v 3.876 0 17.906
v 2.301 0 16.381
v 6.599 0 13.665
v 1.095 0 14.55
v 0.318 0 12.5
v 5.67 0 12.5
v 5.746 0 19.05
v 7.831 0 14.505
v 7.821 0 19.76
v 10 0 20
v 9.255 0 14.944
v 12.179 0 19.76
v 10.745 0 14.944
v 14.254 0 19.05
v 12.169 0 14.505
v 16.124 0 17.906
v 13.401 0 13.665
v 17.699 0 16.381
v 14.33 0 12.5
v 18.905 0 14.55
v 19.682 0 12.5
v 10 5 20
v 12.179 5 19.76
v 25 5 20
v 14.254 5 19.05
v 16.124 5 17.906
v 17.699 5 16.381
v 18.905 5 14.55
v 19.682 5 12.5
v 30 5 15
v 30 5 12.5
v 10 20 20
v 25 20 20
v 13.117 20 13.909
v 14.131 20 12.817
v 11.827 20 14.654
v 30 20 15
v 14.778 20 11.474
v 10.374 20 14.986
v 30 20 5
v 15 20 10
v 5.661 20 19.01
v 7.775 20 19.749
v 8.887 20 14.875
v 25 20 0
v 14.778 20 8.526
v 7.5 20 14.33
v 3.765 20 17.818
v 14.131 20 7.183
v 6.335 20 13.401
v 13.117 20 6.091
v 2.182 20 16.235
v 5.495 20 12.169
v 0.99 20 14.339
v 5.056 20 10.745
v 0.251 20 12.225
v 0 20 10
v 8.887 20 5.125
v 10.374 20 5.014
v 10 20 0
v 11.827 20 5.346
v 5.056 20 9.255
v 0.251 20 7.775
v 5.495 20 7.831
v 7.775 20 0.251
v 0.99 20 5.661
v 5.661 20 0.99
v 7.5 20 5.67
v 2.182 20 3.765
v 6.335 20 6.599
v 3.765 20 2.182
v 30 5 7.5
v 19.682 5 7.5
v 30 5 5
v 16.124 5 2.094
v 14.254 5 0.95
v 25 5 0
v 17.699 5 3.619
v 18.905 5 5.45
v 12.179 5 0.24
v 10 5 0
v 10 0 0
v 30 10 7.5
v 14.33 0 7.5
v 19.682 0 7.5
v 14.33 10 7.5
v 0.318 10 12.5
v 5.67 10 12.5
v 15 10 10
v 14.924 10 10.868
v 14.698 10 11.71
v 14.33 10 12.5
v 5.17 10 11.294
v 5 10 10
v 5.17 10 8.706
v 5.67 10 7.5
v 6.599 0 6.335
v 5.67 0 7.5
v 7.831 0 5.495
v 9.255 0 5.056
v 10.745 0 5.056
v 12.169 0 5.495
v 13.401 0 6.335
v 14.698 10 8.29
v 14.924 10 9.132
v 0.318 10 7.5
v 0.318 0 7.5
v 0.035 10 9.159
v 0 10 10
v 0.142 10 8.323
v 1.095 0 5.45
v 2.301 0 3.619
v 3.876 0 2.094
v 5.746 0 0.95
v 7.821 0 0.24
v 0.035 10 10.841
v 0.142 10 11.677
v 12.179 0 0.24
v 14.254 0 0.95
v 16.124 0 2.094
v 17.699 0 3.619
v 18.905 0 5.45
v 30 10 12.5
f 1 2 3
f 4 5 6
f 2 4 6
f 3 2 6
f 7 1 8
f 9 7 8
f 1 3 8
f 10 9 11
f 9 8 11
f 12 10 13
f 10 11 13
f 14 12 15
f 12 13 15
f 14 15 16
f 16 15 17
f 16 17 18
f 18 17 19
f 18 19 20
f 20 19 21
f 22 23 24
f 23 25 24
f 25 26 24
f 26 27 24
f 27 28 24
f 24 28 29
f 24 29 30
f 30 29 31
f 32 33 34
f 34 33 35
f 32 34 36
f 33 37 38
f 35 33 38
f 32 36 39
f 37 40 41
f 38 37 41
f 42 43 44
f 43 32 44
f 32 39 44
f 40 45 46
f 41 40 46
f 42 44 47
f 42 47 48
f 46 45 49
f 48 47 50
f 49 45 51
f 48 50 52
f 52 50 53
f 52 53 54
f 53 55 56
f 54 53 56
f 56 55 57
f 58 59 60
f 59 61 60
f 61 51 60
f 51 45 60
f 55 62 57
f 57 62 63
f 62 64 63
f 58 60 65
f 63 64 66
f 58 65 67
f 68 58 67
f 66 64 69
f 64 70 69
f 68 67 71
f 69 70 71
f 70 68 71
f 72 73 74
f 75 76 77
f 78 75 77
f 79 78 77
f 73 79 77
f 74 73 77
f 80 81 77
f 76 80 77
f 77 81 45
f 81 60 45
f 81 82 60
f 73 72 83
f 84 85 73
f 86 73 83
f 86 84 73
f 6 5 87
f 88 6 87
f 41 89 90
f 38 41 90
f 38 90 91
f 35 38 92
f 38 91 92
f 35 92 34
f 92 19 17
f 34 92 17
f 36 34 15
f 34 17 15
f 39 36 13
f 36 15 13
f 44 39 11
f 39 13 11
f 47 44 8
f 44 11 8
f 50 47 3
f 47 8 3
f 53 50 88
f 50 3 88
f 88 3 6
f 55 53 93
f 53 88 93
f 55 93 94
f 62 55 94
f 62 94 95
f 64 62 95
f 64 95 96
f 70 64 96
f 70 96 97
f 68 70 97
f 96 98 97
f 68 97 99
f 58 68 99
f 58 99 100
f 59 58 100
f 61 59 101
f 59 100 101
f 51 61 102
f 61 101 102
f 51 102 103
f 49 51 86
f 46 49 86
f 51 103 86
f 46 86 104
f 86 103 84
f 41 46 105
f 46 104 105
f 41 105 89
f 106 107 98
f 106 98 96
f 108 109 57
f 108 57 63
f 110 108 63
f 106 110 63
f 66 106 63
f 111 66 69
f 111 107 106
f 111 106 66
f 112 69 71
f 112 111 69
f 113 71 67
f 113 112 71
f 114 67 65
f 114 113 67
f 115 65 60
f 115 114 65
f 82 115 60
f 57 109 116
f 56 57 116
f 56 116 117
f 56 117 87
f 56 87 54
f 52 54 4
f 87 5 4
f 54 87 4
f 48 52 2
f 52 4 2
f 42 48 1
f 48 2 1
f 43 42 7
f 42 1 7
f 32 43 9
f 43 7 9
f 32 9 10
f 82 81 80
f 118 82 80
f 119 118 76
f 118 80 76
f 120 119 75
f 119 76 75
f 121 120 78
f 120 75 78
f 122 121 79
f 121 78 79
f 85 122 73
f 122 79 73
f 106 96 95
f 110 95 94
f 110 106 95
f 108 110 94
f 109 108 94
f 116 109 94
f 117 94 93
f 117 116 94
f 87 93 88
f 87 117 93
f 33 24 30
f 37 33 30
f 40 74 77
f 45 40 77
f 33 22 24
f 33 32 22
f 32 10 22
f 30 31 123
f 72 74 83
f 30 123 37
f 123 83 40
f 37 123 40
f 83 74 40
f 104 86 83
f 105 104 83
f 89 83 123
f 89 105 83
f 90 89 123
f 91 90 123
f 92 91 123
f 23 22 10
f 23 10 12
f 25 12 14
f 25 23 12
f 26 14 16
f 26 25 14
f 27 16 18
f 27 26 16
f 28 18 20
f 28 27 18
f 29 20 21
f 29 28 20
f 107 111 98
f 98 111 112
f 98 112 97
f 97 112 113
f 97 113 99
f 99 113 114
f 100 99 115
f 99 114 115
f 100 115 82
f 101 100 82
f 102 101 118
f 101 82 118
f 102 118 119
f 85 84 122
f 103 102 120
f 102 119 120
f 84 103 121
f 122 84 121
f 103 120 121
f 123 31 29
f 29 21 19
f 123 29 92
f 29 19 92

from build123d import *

# Parameters (mm, degrees)
F1_DEPTH = 20
F2_R     = 9.99999
F4_DEPTH = 25
F5_R     = 5
F6_DEPTH = 20.001
F7_R     = 9.99999
F8_W     = 10
F8_H     = 5
F9_DEPTH = 30.001


# Not quite as in the source:
# - a fillet or chamfer is up to 0.001 mm smaller than in the source, because OpenCascade refuses the exact size


with BuildPart() as f1:
    # F0 (on Top) → F1 (new body)
    with BuildSketch(Plane.XY):
        Polygon((30, 20), (0, 20), (0, 0), (20, 0), (20, 5), (30, 5), align=None)
    extrude(amount=F1_DEPTH)

    # F2 (radius 10 in the source; OpenCascade refuses exactly that, so slightly less here)
    f2_edges = [f1.edges().sort_by_distance(p)[0] for p in [
        (0, 10, 20),
        (0, 10, 0),
    ]]
    fillet(f2_edges, radius=F2_R)

    # F3 (on Front) → F4 (cut)
    with BuildSketch(Plane.XZ):
        Polygon((30, 20), (25, 20), (30, 15), align=None)
        Polygon((30, 0), (30, 5), (25, 0), align=None)
    extrude(amount=-F4_DEPTH, mode=Mode.SUBTRACT)

    # F5 (on face) → F6 (cut, through all)
    with BuildSketch(Plane.XZ):
        with Locations((10, 10)):
            Circle(F5_R)
    extrude(amount=-F6_DEPTH, mode=Mode.SUBTRACT)

    # F7 (radius 10 in the source; OpenCascade refuses exactly that, so slightly less here)
    f7_edges = [f1.edges().sort_by_distance(p)[0] for p in [
        (20, 2.5, 20),
        (20, 2.5, 0),
    ]]
    fillet(f7_edges, radius=F7_R)

    # F8 (on Right) → F9 (cut, through all)
    with BuildSketch(Plane.YZ):
        with Locations((5, 10)):
            Rectangle(F8_W, F8_H)
    extrude(amount=F9_DEPTH, mode=Mode.SUBTRACT)


solid = f1.part
